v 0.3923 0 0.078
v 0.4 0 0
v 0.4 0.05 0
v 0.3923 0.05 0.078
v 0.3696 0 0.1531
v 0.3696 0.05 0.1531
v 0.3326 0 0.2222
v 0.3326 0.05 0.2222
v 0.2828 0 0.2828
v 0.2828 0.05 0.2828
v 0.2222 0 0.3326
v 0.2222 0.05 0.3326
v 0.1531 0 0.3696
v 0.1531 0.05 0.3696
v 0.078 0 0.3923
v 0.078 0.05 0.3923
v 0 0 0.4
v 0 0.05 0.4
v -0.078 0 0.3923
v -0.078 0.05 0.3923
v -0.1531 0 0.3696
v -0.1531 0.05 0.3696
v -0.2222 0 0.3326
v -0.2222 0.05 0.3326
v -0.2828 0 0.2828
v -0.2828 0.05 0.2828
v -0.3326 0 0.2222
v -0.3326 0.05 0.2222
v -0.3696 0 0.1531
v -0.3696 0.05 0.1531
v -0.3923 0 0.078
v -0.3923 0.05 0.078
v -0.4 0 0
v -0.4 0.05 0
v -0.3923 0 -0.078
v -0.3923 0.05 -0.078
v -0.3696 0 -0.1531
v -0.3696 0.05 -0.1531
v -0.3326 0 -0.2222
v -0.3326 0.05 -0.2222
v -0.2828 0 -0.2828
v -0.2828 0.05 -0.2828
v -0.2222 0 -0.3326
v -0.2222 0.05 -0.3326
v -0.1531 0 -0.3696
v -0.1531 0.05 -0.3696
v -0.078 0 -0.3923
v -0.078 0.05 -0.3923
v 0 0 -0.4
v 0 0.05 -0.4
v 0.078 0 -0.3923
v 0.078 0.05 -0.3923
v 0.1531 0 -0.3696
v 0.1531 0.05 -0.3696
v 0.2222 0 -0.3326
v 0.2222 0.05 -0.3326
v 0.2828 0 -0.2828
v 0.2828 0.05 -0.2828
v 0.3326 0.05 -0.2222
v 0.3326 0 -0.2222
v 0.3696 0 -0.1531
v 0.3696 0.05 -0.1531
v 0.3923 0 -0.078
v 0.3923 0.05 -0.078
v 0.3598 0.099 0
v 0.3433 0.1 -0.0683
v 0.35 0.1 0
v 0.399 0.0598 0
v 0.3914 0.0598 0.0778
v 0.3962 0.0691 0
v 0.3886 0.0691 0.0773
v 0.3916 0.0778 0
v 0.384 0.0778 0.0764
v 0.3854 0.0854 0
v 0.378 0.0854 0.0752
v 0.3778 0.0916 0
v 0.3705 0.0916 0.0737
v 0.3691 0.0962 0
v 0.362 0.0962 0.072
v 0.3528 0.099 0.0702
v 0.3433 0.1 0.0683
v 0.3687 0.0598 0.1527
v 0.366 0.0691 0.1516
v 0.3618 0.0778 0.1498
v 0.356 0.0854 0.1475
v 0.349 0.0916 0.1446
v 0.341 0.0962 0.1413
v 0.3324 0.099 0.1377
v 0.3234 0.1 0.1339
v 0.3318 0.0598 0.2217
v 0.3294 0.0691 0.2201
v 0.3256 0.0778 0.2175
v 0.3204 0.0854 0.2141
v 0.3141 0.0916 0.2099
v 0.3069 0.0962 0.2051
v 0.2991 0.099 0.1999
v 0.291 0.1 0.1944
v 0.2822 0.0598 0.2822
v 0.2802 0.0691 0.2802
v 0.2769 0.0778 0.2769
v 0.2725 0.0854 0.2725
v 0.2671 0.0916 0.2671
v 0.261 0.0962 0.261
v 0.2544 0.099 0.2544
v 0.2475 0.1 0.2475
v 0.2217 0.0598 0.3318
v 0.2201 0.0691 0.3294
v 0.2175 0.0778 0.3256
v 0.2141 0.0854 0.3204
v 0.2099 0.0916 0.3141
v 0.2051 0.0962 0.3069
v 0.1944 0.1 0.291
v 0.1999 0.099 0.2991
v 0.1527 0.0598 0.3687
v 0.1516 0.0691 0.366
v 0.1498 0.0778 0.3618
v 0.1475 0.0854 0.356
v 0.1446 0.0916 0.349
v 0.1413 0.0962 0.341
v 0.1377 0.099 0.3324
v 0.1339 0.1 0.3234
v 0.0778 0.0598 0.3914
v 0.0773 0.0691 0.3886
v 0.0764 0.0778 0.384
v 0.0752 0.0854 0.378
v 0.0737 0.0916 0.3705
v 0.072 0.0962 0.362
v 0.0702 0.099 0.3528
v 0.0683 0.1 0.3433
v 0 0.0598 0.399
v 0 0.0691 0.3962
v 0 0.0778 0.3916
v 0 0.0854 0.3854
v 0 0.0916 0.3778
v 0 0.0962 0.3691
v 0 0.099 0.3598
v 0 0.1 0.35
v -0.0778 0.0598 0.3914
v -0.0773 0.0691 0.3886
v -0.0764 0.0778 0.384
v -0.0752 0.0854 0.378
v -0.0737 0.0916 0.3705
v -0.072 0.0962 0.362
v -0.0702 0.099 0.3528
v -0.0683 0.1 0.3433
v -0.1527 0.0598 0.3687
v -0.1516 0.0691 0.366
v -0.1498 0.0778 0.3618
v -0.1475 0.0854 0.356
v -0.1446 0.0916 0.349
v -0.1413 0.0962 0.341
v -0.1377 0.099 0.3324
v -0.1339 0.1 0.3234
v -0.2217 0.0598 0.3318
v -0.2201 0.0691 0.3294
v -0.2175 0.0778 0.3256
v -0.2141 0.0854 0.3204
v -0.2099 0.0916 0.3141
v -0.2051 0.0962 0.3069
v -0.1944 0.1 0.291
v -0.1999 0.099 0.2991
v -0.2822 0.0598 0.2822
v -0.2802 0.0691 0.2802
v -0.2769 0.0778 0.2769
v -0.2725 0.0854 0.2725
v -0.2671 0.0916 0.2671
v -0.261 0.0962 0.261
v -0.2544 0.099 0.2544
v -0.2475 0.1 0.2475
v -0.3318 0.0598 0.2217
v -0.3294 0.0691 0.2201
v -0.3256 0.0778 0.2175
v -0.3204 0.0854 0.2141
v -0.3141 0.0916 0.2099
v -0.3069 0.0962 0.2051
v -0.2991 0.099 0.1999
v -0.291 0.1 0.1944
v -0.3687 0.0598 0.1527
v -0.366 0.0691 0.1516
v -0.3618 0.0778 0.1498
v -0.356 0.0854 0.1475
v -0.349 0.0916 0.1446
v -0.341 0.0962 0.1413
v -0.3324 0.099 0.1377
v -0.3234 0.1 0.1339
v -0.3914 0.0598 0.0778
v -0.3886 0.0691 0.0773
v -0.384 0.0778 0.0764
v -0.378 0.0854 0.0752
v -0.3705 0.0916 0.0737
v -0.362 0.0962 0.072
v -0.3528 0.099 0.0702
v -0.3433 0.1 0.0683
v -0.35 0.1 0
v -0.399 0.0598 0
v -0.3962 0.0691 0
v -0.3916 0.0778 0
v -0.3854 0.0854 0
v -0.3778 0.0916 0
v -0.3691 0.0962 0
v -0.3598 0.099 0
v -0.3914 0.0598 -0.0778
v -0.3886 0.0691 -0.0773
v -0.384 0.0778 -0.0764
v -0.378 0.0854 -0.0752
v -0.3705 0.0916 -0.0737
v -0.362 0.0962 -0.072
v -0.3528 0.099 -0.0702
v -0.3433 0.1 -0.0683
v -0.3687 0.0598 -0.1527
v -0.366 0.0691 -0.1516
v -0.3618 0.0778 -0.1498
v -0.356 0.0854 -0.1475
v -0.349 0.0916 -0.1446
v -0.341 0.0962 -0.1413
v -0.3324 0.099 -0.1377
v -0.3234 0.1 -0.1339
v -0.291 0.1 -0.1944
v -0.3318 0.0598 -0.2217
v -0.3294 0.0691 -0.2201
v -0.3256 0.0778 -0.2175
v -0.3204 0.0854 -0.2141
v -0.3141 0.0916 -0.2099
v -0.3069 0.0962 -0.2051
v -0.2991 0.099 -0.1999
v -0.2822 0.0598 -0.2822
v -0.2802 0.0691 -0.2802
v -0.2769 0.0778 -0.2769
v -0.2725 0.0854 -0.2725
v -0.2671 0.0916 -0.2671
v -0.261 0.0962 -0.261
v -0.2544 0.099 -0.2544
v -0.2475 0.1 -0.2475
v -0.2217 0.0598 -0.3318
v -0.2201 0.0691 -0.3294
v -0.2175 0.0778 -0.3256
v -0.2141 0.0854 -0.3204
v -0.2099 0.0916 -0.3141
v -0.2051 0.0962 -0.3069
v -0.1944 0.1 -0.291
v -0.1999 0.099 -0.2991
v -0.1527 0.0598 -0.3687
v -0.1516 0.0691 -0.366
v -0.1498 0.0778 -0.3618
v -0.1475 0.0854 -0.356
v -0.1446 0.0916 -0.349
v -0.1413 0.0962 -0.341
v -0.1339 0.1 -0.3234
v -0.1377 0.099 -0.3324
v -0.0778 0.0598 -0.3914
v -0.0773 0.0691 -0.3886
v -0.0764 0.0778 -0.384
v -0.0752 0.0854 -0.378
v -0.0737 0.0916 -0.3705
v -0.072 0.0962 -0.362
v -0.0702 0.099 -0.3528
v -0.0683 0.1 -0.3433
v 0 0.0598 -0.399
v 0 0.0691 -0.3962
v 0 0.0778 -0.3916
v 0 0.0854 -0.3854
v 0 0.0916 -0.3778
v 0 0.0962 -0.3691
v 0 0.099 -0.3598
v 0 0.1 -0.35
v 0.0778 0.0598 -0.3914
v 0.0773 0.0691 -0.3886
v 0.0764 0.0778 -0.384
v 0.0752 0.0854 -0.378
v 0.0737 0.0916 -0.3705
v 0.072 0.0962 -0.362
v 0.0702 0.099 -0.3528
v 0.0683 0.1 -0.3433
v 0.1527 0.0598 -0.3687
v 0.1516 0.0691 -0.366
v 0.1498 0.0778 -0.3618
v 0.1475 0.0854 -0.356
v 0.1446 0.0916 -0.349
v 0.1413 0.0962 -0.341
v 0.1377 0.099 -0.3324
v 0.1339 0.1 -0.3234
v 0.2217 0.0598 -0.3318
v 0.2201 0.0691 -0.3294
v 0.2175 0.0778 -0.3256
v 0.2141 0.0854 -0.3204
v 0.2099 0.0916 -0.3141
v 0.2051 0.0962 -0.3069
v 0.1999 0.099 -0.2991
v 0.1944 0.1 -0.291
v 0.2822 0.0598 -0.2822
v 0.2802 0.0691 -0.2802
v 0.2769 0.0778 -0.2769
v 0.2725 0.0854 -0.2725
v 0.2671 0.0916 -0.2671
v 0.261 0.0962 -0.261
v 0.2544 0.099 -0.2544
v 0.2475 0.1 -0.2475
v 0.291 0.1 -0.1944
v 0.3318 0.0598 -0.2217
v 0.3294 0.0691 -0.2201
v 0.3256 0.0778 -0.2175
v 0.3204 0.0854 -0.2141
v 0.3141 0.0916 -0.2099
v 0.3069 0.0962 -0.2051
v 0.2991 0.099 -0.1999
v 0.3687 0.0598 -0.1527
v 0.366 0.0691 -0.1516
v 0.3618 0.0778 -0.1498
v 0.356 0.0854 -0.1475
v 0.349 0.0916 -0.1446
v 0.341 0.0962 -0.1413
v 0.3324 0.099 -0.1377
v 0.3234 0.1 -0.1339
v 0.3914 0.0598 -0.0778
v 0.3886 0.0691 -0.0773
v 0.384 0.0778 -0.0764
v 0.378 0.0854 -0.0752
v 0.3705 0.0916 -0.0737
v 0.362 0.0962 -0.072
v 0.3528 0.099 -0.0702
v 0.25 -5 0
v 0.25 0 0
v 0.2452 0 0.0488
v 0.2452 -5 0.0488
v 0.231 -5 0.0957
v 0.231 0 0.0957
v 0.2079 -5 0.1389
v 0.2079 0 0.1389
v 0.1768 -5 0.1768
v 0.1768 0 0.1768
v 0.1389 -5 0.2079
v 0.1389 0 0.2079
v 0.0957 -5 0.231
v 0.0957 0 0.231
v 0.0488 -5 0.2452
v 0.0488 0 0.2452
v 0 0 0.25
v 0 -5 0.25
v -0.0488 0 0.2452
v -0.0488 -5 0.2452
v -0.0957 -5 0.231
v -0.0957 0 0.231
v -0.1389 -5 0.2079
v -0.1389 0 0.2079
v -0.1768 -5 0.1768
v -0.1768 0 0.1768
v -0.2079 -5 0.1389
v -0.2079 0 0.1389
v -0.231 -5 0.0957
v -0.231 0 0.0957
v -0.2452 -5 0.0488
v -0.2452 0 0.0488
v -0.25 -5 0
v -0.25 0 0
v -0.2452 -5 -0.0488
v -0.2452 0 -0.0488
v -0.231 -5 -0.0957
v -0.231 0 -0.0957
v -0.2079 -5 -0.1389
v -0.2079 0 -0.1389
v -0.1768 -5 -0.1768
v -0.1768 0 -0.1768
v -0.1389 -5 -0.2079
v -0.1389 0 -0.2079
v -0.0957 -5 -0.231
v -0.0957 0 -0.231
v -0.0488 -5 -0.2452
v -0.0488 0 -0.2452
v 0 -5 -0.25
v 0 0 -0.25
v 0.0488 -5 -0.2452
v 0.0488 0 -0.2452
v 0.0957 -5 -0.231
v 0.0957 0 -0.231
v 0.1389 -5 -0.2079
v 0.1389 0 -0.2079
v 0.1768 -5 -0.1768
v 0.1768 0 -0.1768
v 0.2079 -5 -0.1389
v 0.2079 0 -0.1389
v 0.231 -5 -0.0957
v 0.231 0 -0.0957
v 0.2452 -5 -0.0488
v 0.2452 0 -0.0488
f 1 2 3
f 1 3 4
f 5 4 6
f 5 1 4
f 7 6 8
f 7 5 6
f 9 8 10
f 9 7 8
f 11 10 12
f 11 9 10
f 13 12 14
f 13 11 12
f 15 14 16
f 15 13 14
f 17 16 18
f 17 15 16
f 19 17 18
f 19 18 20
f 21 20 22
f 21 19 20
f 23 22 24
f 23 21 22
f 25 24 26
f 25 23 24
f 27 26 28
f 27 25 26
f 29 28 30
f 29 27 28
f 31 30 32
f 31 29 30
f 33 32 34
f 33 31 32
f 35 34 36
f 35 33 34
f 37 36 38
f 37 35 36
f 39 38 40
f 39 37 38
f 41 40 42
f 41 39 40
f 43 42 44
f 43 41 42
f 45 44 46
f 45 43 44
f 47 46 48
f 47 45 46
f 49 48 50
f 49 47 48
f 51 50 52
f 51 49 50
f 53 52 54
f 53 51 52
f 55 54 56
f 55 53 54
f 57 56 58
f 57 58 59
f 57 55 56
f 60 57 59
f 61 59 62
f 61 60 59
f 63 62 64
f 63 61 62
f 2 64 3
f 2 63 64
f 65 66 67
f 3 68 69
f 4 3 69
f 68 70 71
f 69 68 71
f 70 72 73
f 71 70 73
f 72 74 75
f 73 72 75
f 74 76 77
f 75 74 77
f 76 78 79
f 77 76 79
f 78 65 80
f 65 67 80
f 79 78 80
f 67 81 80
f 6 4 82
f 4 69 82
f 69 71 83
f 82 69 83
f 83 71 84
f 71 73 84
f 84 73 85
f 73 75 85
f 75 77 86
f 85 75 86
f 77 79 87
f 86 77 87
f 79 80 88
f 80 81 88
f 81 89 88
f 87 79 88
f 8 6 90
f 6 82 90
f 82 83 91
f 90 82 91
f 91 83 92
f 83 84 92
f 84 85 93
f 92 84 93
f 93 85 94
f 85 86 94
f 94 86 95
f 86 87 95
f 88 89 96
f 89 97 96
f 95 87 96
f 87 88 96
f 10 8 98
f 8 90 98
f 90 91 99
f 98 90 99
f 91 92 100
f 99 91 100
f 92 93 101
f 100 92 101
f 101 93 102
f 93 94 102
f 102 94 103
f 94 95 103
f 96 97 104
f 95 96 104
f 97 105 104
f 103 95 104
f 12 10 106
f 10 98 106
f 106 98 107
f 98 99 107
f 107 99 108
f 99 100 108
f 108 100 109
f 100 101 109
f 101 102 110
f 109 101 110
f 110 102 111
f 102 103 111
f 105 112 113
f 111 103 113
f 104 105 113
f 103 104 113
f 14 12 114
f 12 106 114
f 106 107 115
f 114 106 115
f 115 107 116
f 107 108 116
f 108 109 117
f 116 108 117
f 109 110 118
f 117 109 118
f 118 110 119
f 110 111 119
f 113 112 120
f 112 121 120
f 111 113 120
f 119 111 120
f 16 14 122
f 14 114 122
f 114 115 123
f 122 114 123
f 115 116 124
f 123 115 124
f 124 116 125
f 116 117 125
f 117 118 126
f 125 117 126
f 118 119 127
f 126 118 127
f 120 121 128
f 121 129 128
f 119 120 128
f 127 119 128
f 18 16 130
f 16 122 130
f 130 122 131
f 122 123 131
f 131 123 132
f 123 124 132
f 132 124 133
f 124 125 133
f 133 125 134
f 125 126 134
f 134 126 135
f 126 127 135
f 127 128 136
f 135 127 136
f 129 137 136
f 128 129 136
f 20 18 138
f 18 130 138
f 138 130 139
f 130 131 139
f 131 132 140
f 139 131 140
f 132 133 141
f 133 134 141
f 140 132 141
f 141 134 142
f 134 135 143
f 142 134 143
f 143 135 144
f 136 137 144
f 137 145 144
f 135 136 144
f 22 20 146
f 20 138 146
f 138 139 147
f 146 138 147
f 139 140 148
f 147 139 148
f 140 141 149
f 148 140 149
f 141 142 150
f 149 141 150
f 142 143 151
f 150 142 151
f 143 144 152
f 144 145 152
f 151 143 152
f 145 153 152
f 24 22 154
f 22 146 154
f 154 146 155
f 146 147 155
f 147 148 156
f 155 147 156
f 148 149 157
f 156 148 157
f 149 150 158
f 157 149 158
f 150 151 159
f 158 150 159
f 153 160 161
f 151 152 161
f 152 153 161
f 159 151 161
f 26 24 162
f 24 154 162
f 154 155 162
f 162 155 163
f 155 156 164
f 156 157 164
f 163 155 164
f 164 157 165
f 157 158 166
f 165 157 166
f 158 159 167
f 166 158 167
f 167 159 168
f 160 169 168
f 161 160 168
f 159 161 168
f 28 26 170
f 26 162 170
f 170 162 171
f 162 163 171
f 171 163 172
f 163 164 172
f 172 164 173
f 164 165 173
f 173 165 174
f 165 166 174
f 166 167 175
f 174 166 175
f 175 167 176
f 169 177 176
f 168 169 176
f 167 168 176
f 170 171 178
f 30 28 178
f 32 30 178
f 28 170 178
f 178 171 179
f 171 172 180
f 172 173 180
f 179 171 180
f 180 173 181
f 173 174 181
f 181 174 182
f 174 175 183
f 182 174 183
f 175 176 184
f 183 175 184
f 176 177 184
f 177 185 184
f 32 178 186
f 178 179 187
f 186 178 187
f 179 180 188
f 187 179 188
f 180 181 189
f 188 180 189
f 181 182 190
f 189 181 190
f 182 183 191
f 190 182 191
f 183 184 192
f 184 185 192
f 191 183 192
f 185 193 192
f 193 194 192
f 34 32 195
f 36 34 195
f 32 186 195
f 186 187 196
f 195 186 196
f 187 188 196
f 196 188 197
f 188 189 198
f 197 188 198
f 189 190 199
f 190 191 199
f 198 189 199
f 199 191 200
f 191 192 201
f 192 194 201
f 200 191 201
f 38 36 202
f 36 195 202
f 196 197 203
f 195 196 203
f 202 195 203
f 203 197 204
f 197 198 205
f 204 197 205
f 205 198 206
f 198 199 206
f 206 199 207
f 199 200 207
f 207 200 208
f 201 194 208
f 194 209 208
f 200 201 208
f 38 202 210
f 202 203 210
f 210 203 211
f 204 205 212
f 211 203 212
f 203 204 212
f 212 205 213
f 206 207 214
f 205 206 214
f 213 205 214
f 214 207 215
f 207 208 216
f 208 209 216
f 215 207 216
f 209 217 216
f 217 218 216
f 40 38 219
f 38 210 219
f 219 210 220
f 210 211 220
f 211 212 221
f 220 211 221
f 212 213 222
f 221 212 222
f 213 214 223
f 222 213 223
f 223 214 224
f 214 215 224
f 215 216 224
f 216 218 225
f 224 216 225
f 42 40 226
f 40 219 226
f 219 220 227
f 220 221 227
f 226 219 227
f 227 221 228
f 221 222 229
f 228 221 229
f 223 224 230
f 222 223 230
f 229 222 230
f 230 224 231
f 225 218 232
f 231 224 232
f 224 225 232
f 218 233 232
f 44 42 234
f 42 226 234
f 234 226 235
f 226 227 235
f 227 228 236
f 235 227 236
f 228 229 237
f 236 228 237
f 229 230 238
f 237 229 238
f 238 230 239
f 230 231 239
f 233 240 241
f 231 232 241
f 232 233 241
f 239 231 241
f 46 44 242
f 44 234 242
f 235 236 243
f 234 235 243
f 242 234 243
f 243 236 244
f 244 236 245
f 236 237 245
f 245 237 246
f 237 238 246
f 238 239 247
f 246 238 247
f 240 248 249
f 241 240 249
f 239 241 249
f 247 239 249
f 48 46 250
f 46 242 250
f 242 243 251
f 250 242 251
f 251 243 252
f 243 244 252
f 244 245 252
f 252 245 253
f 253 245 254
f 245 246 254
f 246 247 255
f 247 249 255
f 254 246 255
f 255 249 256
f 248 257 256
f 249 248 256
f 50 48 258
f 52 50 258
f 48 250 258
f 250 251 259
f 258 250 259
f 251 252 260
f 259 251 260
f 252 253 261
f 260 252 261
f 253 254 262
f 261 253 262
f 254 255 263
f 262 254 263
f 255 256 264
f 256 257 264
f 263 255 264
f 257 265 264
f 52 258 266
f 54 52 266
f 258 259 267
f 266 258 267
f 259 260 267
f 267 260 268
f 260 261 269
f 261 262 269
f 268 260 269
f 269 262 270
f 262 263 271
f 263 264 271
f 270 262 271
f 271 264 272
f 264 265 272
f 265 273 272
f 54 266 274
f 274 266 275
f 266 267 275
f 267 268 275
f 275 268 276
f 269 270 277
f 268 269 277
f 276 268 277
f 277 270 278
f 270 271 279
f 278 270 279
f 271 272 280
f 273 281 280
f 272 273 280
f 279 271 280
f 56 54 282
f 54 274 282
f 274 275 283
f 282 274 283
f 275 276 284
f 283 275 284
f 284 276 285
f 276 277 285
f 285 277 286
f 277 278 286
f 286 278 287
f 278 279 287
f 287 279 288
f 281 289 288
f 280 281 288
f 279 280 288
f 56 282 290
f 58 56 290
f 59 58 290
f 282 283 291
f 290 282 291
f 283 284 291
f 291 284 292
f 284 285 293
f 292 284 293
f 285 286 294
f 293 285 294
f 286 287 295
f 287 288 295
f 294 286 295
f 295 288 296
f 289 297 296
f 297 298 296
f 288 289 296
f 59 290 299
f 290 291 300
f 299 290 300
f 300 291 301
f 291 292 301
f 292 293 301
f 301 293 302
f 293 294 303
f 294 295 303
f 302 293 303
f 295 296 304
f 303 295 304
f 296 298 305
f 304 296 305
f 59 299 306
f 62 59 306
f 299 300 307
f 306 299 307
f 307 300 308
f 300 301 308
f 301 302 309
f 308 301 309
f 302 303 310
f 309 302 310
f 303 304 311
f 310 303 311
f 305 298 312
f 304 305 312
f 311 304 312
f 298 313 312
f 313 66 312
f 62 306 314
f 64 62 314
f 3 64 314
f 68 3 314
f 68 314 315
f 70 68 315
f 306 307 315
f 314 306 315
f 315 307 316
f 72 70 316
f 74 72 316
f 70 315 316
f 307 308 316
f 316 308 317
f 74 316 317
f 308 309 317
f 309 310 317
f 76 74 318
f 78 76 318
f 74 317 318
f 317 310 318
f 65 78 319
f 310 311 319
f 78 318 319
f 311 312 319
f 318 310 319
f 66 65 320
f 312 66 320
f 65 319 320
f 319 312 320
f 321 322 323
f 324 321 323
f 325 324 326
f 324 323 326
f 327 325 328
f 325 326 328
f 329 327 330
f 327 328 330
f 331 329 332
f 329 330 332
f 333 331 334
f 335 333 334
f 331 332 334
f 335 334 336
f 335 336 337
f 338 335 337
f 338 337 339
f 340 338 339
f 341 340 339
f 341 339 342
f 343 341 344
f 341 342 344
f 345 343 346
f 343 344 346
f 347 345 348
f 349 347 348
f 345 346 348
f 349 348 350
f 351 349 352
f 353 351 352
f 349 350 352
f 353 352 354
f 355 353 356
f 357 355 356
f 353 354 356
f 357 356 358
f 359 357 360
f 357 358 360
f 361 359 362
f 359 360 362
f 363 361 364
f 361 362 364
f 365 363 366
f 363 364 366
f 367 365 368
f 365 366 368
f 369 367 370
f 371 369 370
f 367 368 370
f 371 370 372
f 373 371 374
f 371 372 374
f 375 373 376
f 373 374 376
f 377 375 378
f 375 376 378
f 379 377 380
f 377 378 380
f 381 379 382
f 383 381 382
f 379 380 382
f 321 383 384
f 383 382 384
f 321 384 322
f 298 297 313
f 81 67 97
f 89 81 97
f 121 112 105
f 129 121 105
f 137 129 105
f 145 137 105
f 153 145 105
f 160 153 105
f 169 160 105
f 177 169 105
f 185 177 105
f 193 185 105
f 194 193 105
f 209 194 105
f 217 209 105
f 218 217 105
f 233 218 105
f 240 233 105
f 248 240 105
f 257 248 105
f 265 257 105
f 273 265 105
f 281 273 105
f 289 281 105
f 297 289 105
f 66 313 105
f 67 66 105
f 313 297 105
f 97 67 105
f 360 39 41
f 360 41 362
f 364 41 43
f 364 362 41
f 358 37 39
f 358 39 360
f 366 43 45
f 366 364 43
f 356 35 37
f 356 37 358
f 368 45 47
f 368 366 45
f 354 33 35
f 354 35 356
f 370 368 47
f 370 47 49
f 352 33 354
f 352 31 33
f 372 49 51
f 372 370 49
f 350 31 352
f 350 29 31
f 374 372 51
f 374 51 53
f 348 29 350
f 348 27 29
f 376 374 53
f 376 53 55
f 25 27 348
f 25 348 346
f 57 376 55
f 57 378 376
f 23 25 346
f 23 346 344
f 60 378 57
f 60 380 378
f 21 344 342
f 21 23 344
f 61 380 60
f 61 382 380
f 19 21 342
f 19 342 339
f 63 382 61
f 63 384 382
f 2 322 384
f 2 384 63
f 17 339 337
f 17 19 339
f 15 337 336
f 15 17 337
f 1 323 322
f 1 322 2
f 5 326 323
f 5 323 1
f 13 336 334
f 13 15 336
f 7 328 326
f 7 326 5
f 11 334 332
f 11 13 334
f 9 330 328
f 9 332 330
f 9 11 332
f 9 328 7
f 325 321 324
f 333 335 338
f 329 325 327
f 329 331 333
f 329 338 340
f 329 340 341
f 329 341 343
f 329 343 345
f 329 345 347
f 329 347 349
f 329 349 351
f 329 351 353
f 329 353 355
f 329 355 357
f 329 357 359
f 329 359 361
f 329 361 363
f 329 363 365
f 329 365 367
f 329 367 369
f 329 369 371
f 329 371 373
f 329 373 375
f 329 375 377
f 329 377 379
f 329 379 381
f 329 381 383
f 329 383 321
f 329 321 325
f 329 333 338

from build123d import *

# Parameters (mm, degrees)
F0_R     = 0.4
F1_DEPTH = 0.1
F2_R     = 0.05
F3_R     = 0.25
F4_DEPTH = 5


with BuildPart() as f1:
    # F0 (on Front) → F1 (new body)
    with BuildSketch(Plane.XZ):
        Circle(F0_R)
    extrude(amount=-F1_DEPTH)

    # F2
    f2_edges = [f1.edges().sort_by_distance(p)[0] for p in [
        (-0.4, 0.1, 0),
    ]]
    fillet(f2_edges, radius=F2_R)

    # F3 (on face) → F4 (join)
    with BuildSketch(Plane.XZ):
        Circle(F3_R)
    extrude(amount=F4_DEPTH)


solid = f1.part
